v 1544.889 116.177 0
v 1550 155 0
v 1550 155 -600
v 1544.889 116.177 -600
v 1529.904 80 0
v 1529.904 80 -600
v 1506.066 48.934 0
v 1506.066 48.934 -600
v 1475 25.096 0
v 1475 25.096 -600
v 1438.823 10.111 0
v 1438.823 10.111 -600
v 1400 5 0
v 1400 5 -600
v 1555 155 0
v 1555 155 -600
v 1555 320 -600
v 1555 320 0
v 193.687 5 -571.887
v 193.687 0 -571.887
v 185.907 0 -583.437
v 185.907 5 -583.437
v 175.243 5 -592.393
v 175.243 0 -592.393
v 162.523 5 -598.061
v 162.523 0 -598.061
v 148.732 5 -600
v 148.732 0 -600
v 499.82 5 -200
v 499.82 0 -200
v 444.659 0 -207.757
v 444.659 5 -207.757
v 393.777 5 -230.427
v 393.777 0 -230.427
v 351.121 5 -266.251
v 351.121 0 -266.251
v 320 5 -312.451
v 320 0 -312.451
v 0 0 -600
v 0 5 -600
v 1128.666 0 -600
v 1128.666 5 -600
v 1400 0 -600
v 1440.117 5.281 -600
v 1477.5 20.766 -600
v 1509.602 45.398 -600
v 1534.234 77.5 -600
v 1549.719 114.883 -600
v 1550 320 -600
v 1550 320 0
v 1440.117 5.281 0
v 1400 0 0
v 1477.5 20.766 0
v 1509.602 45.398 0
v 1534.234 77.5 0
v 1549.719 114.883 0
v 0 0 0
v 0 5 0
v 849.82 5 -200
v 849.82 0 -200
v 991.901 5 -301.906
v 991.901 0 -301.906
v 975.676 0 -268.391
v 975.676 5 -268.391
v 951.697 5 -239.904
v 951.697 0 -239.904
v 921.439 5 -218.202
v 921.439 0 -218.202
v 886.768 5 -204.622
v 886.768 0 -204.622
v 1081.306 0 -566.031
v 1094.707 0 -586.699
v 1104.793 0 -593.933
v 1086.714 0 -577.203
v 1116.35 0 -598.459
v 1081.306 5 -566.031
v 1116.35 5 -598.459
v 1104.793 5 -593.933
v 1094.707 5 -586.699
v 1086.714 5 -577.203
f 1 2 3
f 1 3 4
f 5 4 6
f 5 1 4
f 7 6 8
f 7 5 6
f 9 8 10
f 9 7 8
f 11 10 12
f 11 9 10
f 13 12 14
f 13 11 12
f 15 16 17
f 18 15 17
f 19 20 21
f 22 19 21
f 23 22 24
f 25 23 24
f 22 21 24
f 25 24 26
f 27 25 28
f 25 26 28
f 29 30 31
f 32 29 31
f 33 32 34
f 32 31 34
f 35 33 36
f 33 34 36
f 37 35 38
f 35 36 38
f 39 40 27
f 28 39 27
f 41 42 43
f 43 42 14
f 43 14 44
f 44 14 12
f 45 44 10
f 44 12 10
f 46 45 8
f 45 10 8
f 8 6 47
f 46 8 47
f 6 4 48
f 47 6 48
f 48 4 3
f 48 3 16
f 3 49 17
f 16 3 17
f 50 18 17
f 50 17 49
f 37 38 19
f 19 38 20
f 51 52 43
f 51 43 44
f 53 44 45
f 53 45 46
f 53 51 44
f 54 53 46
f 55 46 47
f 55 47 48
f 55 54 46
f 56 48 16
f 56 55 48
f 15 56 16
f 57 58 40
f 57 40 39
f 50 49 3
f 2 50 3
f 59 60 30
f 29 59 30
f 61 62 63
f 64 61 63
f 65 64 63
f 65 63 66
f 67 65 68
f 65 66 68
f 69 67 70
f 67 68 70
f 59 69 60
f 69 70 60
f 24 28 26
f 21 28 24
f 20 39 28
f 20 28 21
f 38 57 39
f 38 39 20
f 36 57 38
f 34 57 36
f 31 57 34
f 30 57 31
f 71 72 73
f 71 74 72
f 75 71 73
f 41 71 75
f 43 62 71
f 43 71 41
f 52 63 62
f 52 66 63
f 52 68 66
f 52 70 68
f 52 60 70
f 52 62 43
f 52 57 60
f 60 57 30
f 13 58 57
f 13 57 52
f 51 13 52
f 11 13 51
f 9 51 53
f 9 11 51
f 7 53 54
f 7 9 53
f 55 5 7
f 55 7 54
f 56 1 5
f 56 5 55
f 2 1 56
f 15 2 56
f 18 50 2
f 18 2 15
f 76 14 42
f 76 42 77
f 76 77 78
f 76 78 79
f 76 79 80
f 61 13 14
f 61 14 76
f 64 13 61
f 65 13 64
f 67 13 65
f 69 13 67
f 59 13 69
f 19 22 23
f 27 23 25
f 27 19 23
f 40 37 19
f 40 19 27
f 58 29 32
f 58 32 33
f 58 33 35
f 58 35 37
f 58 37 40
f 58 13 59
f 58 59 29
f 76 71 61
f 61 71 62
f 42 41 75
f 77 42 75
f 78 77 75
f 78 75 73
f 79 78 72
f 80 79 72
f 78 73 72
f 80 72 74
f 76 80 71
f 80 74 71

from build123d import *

# Parameters (mm, degrees)
F1_DEPTH = 600
F3_DEPTH = 5


with BuildPart() as f1:
    # F0 (on Top) → F1 (new body)
    with BuildSketch(Plane.XY):
        with BuildLine():
            Line((0, 5), (0, 0))
            Line((0, 0), (1400, 0))
            ThreePointArc((1400, 0), (1509.601551, 45.398449), (1555, 155))
            Line((1555, 155), (1555, 320))
            Line((1555, 320), (1550, 320))
            Line((1550, 320), (1550, 155))
            ThreePointArc((1550, 155), (1506.066017, 48.933983), (1400, 5))
            Line((1400, 5), (0, 5))
        make_face()
    extrude(amount=-F1_DEPTH)

    # F2 (on face) → F3 (cut)
    with BuildSketch(Plane.XZ):
        with BuildLine():
            Line((320, -312.450663), (193.687297, -571.887334))
            ThreePointArc((193.687297, -571.887334), (175.243069, -592.393199), (148.73238, -600))
            Line((148.73238, -600), (1128.666073, -600))
            ThreePointArc((1128.666073, -600), (1099.524718, -590.62981), (1081.305765, -566.031258))
            Line((1081.305765, -566.031258), (991.900594, -301.906227))
            ThreePointArc((991.900594, -301.906227), (937.243734, -228.110571), (849.81967, -200))
            Line((849.81967, -200), (499.81967, -200))
            ThreePointArc((499.81967, -200), (393.776913, -230.427202), (320, -312.450663))
        make_face()
    extrude(amount=-F3_DEPTH, mode=Mode.SUBTRACT)


solid = f1.part
